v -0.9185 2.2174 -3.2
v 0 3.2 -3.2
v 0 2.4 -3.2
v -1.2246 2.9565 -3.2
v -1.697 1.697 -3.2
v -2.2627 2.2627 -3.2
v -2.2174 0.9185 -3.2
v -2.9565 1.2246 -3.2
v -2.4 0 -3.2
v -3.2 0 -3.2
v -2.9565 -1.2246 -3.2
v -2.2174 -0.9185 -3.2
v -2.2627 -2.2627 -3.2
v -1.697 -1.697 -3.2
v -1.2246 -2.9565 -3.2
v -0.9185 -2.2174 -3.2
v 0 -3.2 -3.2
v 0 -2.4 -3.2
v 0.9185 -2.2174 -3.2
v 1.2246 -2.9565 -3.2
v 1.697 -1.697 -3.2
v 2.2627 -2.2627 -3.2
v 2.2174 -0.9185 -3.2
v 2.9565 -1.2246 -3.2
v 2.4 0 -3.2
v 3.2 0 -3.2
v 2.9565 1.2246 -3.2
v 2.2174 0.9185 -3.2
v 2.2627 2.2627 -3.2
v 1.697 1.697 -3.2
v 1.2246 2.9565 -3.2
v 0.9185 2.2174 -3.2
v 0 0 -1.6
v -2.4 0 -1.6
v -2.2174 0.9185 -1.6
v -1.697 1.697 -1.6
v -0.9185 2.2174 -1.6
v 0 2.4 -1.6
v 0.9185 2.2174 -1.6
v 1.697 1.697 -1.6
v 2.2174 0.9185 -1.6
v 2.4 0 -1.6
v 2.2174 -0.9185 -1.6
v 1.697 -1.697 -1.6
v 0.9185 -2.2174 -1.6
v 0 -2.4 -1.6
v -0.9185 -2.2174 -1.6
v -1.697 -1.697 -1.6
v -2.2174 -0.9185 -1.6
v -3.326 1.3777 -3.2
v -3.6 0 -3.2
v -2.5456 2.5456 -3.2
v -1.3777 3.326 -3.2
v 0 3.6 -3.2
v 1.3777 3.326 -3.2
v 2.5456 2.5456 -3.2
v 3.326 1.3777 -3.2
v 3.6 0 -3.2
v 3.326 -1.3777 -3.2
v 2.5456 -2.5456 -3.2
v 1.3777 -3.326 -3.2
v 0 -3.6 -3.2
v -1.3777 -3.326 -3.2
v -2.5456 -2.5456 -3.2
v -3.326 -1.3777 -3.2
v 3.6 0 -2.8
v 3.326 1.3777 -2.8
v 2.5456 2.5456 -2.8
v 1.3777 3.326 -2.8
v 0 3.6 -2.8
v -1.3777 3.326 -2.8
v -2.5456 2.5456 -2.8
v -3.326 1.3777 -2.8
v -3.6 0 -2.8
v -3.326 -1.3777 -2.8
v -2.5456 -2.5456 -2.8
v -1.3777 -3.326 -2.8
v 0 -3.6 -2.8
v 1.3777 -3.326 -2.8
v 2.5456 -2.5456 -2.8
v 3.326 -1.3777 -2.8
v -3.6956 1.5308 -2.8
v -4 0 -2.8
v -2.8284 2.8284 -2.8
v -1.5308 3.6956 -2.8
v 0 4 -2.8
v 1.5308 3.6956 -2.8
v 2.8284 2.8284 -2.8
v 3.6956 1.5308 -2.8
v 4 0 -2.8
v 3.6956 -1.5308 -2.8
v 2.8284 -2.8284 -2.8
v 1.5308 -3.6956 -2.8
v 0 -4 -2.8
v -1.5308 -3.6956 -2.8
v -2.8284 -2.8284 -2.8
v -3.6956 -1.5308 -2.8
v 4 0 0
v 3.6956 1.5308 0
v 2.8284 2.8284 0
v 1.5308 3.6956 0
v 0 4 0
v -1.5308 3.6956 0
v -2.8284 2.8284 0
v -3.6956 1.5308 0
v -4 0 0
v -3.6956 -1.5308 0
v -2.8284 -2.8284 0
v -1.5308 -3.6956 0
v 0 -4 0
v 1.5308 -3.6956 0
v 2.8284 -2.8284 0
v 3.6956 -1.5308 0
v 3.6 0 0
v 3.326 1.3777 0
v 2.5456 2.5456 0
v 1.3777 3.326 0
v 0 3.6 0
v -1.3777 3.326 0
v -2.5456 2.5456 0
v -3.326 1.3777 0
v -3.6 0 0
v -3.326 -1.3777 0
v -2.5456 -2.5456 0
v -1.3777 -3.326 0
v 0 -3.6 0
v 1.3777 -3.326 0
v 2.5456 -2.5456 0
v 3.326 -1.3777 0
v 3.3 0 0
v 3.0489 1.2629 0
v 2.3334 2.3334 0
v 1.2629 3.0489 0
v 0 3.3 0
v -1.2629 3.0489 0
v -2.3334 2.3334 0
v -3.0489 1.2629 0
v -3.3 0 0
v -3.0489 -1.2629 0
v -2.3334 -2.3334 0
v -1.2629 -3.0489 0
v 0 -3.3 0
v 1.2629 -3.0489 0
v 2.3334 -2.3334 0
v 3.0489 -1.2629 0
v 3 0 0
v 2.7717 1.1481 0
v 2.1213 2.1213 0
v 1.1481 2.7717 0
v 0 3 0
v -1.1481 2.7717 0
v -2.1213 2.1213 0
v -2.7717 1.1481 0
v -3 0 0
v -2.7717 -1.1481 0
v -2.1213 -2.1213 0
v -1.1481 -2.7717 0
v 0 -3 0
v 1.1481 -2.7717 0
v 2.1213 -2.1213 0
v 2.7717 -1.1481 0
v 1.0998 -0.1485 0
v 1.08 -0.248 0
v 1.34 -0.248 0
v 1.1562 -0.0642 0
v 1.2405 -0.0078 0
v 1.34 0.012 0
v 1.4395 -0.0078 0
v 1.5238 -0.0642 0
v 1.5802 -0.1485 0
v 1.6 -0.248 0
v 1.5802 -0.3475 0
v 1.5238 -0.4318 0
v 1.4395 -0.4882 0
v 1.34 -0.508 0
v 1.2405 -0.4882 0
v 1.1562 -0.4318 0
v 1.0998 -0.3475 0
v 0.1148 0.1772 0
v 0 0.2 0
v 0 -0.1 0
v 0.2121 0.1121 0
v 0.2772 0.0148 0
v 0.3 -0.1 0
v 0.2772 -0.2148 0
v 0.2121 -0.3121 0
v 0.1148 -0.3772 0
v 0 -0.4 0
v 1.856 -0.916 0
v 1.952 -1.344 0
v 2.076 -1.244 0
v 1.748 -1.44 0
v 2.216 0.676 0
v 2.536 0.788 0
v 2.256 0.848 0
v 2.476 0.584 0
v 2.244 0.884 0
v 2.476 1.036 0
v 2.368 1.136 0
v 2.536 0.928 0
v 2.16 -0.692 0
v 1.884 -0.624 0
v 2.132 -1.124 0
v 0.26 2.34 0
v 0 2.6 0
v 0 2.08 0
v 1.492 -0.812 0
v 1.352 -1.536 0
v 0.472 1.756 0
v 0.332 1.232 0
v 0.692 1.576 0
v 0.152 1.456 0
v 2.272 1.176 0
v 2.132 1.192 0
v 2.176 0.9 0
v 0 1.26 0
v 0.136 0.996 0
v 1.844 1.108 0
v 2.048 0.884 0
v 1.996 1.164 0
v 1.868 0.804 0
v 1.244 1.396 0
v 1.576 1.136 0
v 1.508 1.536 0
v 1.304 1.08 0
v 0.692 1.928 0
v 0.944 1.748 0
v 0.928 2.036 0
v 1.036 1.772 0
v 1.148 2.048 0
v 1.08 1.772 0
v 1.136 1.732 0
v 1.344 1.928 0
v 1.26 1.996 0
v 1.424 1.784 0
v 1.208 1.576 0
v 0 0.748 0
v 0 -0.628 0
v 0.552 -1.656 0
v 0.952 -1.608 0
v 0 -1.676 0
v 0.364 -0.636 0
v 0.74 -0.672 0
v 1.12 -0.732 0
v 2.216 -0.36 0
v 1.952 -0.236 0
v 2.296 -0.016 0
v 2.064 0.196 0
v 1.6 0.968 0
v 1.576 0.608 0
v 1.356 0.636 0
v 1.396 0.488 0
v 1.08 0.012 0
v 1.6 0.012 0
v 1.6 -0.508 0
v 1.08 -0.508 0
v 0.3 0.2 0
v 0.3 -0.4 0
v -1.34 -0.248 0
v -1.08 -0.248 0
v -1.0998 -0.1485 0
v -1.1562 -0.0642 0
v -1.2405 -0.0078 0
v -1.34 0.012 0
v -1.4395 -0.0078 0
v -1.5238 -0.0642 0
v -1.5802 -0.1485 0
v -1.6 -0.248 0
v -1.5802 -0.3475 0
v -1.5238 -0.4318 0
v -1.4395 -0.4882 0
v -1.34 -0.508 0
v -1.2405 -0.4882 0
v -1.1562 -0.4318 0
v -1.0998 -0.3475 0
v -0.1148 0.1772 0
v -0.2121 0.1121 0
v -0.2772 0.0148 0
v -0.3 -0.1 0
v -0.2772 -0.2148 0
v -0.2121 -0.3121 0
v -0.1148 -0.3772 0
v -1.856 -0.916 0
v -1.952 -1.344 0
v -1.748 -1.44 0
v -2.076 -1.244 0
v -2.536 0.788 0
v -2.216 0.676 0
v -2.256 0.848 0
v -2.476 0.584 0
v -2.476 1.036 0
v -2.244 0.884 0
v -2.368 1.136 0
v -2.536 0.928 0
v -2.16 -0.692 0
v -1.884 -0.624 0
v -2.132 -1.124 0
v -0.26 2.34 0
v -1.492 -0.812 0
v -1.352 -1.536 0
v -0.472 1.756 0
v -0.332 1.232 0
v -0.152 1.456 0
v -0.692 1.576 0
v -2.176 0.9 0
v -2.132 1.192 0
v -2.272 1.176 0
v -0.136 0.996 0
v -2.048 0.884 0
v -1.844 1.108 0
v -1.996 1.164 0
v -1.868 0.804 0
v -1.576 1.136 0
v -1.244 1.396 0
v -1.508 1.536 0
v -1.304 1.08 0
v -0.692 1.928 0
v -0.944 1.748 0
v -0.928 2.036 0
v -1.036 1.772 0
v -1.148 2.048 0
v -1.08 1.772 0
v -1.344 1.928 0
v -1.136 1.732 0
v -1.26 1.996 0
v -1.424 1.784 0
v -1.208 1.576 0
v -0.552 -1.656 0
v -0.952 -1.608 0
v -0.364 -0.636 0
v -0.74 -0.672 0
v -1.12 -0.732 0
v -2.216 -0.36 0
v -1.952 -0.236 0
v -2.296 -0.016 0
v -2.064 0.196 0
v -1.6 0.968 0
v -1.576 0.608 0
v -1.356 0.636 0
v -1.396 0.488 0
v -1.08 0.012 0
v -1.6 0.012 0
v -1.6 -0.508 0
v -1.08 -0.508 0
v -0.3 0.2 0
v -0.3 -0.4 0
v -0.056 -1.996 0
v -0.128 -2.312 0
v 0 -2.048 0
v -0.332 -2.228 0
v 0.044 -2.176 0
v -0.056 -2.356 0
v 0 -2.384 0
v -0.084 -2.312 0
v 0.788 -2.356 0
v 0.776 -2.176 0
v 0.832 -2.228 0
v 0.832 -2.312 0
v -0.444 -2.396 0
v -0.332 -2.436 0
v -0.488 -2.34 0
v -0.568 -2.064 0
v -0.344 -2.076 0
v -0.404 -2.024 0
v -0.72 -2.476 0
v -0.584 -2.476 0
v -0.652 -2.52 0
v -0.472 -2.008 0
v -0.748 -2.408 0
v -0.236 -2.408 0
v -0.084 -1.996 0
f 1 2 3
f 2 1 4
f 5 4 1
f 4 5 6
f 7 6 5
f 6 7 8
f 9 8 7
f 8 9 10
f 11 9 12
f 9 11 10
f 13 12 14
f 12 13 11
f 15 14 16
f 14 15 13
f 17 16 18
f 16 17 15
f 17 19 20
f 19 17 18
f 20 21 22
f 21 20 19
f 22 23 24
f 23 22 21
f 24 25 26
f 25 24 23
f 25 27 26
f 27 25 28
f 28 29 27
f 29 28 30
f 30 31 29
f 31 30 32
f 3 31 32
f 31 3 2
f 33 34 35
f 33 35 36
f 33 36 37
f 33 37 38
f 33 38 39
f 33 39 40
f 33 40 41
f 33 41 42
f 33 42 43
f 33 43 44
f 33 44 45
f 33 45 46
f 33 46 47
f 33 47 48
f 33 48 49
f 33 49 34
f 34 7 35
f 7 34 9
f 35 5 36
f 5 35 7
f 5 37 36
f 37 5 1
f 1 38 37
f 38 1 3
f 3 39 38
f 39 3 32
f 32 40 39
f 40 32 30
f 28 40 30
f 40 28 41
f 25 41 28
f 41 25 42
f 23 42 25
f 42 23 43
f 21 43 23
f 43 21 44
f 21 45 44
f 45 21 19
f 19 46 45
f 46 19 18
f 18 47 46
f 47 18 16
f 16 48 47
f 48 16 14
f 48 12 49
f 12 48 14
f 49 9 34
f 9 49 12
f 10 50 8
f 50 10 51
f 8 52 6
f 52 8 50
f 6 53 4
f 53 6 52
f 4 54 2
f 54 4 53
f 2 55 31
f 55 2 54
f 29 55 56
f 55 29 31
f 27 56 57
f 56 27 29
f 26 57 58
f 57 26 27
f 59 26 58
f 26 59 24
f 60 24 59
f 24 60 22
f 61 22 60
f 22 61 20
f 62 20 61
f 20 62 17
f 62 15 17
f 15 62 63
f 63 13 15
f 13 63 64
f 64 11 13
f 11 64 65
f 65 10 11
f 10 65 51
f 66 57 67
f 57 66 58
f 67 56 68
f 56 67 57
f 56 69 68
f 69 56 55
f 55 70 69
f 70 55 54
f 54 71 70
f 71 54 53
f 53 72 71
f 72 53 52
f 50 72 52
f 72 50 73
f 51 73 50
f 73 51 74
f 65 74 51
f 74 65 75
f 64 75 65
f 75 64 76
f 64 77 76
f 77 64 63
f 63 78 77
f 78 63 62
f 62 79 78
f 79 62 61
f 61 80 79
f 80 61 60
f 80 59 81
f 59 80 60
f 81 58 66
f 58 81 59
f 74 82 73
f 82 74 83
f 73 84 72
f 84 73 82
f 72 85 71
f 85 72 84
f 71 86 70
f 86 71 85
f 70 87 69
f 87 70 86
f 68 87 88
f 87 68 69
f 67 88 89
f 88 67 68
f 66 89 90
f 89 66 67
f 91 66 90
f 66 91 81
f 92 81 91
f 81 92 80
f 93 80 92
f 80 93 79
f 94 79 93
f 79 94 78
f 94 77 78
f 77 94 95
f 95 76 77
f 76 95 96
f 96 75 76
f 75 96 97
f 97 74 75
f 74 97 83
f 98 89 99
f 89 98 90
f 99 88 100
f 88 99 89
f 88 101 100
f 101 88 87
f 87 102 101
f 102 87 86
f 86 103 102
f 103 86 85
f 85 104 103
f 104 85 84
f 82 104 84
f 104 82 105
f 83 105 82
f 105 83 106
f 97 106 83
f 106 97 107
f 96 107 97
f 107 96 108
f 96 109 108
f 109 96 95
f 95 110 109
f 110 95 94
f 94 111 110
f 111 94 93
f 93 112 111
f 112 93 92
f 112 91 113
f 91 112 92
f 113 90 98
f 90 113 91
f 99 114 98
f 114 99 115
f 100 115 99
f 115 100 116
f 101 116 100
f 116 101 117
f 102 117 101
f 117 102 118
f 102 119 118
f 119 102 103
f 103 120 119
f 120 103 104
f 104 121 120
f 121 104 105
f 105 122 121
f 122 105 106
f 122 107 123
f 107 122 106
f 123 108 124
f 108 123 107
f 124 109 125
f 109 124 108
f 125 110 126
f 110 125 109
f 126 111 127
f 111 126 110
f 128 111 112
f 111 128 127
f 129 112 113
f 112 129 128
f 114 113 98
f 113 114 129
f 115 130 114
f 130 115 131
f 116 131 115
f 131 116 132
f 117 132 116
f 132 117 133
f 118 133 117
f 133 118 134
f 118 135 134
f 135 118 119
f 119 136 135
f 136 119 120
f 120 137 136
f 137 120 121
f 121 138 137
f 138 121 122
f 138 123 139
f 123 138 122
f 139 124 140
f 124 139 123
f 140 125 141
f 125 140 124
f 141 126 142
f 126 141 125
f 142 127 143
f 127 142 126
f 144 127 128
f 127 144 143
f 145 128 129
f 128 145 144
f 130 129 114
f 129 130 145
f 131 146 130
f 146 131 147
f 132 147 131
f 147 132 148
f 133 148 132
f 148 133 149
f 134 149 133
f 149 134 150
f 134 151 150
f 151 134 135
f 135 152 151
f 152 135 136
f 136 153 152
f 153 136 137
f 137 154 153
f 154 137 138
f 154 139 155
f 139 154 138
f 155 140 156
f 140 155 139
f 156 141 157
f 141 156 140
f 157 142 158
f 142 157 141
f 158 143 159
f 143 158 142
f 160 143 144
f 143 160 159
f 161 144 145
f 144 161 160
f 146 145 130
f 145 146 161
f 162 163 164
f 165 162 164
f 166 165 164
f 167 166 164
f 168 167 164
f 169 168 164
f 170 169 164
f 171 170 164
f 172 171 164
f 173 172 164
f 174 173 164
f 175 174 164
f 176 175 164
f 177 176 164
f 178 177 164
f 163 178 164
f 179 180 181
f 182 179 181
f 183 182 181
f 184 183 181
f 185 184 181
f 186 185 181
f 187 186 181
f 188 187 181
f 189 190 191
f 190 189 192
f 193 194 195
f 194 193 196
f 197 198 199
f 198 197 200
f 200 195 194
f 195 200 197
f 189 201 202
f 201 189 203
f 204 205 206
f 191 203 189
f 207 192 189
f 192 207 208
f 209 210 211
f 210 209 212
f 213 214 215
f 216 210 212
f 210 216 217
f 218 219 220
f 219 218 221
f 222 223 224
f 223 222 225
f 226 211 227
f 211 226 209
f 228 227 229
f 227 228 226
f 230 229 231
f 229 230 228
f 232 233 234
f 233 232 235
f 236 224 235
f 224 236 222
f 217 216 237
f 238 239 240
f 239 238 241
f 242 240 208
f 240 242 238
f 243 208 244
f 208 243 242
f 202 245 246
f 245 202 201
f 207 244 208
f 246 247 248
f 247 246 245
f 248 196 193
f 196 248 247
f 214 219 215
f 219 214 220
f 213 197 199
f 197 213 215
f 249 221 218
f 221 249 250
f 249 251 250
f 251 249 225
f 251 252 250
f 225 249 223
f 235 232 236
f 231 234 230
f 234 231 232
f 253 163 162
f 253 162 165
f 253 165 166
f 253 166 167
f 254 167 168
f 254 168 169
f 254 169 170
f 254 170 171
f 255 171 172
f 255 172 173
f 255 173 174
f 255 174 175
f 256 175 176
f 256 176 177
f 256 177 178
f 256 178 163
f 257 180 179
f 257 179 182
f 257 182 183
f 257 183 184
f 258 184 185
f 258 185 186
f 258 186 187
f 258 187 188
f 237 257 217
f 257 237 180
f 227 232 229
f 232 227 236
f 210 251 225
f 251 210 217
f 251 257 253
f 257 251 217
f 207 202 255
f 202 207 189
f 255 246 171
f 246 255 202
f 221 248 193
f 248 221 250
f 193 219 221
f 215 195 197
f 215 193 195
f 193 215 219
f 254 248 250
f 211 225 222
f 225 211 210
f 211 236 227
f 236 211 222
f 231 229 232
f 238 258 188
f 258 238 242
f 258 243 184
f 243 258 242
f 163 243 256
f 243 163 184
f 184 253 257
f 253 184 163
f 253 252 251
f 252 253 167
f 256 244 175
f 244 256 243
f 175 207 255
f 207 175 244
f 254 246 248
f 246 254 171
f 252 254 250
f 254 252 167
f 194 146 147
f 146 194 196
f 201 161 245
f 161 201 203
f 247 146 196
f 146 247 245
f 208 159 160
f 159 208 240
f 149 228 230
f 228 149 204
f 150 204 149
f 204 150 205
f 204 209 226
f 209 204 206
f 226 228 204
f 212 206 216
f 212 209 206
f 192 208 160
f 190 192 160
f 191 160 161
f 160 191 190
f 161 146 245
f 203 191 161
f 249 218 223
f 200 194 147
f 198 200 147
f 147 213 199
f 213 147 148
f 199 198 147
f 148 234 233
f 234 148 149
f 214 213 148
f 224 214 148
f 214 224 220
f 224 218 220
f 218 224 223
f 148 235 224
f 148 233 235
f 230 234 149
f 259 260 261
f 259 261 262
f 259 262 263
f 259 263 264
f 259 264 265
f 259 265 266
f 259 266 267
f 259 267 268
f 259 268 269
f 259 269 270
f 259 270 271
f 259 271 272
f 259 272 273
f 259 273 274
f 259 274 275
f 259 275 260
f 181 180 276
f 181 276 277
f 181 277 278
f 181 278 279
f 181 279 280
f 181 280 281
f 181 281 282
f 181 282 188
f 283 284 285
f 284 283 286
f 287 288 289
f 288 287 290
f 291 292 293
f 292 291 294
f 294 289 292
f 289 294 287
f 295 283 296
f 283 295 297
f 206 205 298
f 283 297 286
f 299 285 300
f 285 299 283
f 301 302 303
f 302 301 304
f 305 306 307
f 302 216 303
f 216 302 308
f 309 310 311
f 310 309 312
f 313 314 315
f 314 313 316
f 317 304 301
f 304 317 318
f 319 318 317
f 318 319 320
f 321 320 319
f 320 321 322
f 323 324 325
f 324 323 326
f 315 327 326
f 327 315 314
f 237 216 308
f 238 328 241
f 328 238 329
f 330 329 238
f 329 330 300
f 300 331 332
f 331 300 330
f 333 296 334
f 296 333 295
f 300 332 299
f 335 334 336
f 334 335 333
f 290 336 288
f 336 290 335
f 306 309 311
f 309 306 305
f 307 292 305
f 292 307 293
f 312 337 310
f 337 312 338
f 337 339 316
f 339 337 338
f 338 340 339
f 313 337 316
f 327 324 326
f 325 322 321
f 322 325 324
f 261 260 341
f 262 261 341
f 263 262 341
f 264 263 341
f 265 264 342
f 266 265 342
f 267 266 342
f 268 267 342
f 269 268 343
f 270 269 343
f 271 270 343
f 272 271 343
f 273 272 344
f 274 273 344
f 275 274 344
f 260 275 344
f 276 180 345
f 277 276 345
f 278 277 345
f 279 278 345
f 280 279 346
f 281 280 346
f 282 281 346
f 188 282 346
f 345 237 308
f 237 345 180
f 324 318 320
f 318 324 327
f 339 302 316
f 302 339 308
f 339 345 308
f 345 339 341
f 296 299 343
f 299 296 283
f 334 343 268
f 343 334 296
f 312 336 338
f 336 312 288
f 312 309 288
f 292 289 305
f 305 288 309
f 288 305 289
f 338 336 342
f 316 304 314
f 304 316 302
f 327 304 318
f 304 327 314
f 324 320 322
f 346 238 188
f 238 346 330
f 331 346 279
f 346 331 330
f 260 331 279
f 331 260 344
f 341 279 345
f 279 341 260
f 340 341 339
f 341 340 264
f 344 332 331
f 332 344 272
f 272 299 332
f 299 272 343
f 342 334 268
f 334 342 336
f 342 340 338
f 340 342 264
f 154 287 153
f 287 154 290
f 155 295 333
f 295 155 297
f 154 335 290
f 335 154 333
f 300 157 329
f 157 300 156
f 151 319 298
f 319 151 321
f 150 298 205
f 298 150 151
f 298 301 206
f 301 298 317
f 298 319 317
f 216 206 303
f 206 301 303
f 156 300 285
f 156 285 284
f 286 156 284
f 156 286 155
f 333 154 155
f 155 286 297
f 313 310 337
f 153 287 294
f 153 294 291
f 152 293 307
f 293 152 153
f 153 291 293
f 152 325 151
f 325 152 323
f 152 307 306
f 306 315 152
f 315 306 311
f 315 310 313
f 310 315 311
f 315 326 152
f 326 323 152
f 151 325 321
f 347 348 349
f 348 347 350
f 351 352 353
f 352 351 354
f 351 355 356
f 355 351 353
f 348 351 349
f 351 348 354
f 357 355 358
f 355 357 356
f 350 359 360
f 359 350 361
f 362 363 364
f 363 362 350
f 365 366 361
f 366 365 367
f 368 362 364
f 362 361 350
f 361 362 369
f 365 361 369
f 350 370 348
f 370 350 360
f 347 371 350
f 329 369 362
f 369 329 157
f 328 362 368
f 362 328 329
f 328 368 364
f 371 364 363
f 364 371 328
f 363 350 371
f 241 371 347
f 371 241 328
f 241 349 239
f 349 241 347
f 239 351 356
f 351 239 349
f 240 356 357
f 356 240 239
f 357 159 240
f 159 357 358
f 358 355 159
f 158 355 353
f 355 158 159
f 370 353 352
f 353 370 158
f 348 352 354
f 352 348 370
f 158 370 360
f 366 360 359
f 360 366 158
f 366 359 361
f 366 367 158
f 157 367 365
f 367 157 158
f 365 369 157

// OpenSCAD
use <../lib.scad>
use <../p/4-4ering.scad>
use <../p/4-4ring10.scad>
use <../p/4-4ring11.scad>
use <s/98138p2xs01.scad>
use <s/98138s01.scad>
function ldraw_lib__98138p2x() = [
// 0 Tile  1 x  1 Round with Gold Crown Coin Pattern
// 0 Name: 98138p2x.dat
// 0 Author: Vincent Messenet [Cheenzo]
// 0 !LDRAW_ORG Part UPDATE 2024-06
// 0 !LICENSE Licensed under CC BY 4.0 : see CAreadme.txt
// 
// 0 BFC CERTIFY CCW
  [0,"BFC","CERTIFY"],
  [0,"BFC","CCW"],
// 
// 0 !KEYWORDS Bricklink 98138pb260, Set 10305, Set 43205, Set 43206, Set 43208
// 
// 0 !HISTORY 2024-03-23 [OrionP] Updated ring primitives
// 0 !HISTORY 2024-07-29 [OrionP] Official Update 2024-06
// 
// 1 16 0 0 0 1 0 0 0 1 0 0 0 1 s\98138s01.dat
  [1,16,0,0,0,1,0,0,0,1,0,0,0,1, ldraw_lib__s__98138s01()],
// 1 82 0 0 0 .75 0 0 0 1 0 0 0 .75 4-4ring11.dat
  [1,82,0,0,0,.75,0,0,0,1,0,0,0,.75, ldraw_lib__4_4ring11()],
// 1 308 0 0 0 .75 0 0 0 1 0 0 0 .75 4-4ring10.dat
  [1,308,0,0,0,.75,0,0,0,1,0,0,0,.75, ldraw_lib__4_4ring10()],
// 1 16 0 0 0 7.5 0 0 0 1 0 0 0 7.5 4-4ering.dat
  [1,16,0,0,0,7.5,0,0,0,1,0,0,0,7.5, ldraw_lib__4_4ering()],
// 1 16 0 0 0 1 0 0 0 1 0 0 0 1 s\98138p2xs01.dat
  [1,16,0,0,0,1,0,0,0,1,0,0,0,1, ldraw_lib__s__98138p2xs01()],
// 1 16 0 0 0 -1 0 0 0 1 0 0 0 1 s\98138p2xs01.dat
  [1,16,0,0,0,-1,0,0,0,1,0,0,0,1, ldraw_lib__s__98138p2xs01()],
// 
// 4 308 -.83 0 -5.57 -.32 0 -5.78 0 0 -5.12 -.14 0 -4.99
  [4,308,-.83,0,-5.57,-.32,0,-5.78,0,0,-5.12,-.14,0,-4.99],
// 4 308 0 0 -5.96 .11 0 -5.44 -.21 0 -5.78 -.14 0 -5.89
  [4,308,0,0,-5.96,.11,0,-5.44,-.21,0,-5.78,-.14,0,-5.89],
// 4 308 0 0 -5.96 1.97 0 -5.89 1.94 0 -5.44 .11 0 -5.44
  [4,308,0,0,-5.96,1.97,0,-5.89,1.94,0,-5.44,.11,0,-5.44],
// 4 308 0 0 -5.12 -.32 0 -5.78 -.21 0 -5.78 .11 0 -5.44
  [4,308,0,0,-5.12,-.32,0,-5.78,-.21,0,-5.78,.11,0,-5.44],
// 4 308 2.08 0 -5.78 2.08 0 -5.57 1.94 0 -5.44 1.97 0 -5.89
  [4,308,2.08,0,-5.78,2.08,0,-5.57,1.94,0,-5.44,1.97,0,-5.89],
// 4 308 -.83 0 -6.09 -.83 0 -5.57 -1.22 0 -5.85 -1.11 0 -5.99
  [4,308,-.83,0,-6.09,-.83,0,-5.57,-1.22,0,-5.85,-1.11,0,-5.99],
// 4 308 -1.42 0 -5.16 -.83 0 -5.57 -.86 0 -5.19 -1.01 0 -5.06
  [4,308,-1.42,0,-5.16,-.83,0,-5.57,-.86,0,-5.19,-1.01,0,-5.06],
// 4 308 -1.22 0 -5.85 -1.8 0 -6.19 -1.63 0 -6.3 -1.46 0 -6.19
  [4,308,-1.22,0,-5.85,-1.8,0,-6.19,-1.63,0,-6.3,-1.46,0,-6.19],
// 3 308 -1.18 0 -5.02 -1.42 0 -5.16 -1.01 0 -5.06
  [3,308,-1.18,0,-5.02,-1.42,0,-5.16,-1.01,0,-5.06],
// 4 308 -.83 0 -5.57 -1.42 0 -5.16 -1.87 0 -6.02 -1.22 0 -5.85
  [4,308,-.83,0,-5.57,-1.42,0,-5.16,-1.87,0,-6.02,-1.22,0,-5.85],
// 3 308 -1.8 0 -6.19 -1.22 0 -5.85 -1.87 0 -6.02
  [3,308,-1.8,0,-6.19,-1.22,0,-5.85,-1.87,0,-6.02],
// 4 308 -.83 0 -6.09 -.59 0 -6.02 -.32 0 -5.78 -.83 0 -5.57
  [4,308,-.83,0,-6.09,-.59,0,-6.02,-.32,0,-5.78,-.83,0,-5.57],
// 3 308 -.14 0 -4.99 -.21 0 -4.99 -.83 0 -5.57
  [3,308,-.14,0,-4.99,-.21,0,-4.99,-.83,0,-5.57],
// 4 16 -2.87025 0 -6.92925 -1.87 0 -6.02 -1.42 0 -5.16 -2.38 0 -4.02
  [4,16,-2.87025,0,-6.92925,-1.87,0,-6.02,-1.42,0,-5.16,-2.38,0,-4.02],
// 4 16 -2.38 0 -4.02 -1.42 0 -5.16 -1.18 0 -5.02 -1.38 0 -4.14
  [4,16,-2.38,0,-4.02,-1.42,0,-5.16,-1.18,0,-5.02,-1.38,0,-4.14],
// 3 16 -1.38 0 -4.14 -1.18 0 -5.02 -1.01 0 -5.06
  [3,16,-1.38,0,-4.14,-1.18,0,-5.02,-1.01,0,-5.06],
// 4 16 -.86 0 -5.19 -.21 0 -4.99 -1.38 0 -4.14 -1.01 0 -5.06
  [4,16,-.86,0,-5.19,-.21,0,-4.99,-1.38,0,-4.14,-1.01,0,-5.06],
// 3 16 -.86 0 -5.19 -.83 0 -5.57 -.21 0 -4.99
  [3,16,-.86,0,-5.19,-.83,0,-5.57,-.21,0,-4.99],
// 4 16 -1.38 0 -4.14 -.21 0 -4.99 -.14 0 -4.99 0 0 -4.19
  [4,16,-1.38,0,-4.14,-.21,0,-4.99,-.14,0,-4.99,0,0,-4.19],
// 4 16 0 0 -5.12 1.38 0 -4.14 0 0 -4.19 -.14 0 -4.99
  [4,16,0,0,-5.12,1.38,0,-4.14,0,0,-4.19,-.14,0,-4.99],
// 4 16 1.38 0 -4.14 0 0 -5.12 .11 0 -5.44 1.94 0 -5.44
  [4,16,1.38,0,-4.14,0,0,-5.12,.11,0,-5.44,1.94,0,-5.44],
// 4 16 1.94 0 -5.44 2.08 0 -5.57 2.38 0 -4.02 1.38 0 -4.14
  [4,16,1.94,0,-5.44,2.08,0,-5.57,2.38,0,-4.02,1.38,0,-4.14],
// 4 16 2.38 0 -4.02 2.08 0 -5.57 2.08 0 -5.78 2.87025 0 -6.92925
  [4,16,2.38,0,-4.02,2.08,0,-5.57,2.08,0,-5.78,2.87025,0,-6.92925],
// 3 16 2.08 0 -5.78 1.97 0 -5.89 2.87025 0 -6.92925
  [3,16,2.08,0,-5.78,1.97,0,-5.89,2.87025,0,-6.92925],
// 4 16 2.87025 0 -6.92925 1.97 0 -5.89 0 0 -5.96 0 0 -7.5
  [4,16,2.87025,0,-6.92925,1.97,0,-5.89,0,0,-5.96,0,0,-7.5],
// 4 16 -.14 0 -5.89 -.59 0 -6.02 0 0 -7.5 0 0 -5.96
  [4,16,-.14,0,-5.89,-.59,0,-6.02,0,0,-7.5,0,0,-5.96],
// 4 16 -.59 0 -6.02 -.14 0 -5.89 -.21 0 -5.78 -.32 0 -5.78
  [4,16,-.59,0,-6.02,-.14,0,-5.89,-.21,0,-5.78,-.32,0,-5.78],
// 3 16 0 0 -7.5 -.59 0 -6.02 -.83 0 -6.09
  [3,16,0,0,-7.5,-.59,0,-6.02,-.83,0,-6.09],
// 4 16 -1.46 0 -6.19 0 0 -7.5 -.83 0 -6.09 -1.11 0 -5.99
  [4,16,-1.46,0,-6.19,0,0,-7.5,-.83,0,-6.09,-1.11,0,-5.99],
// 3 16 -1.46 0 -6.19 -1.11 0 -5.99 -1.22 0 -5.85
  [3,16,-1.46,0,-6.19,-1.11,0,-5.99,-1.22,0,-5.85],
// 3 16 -1.46 0 -6.19 -1.63 0 -6.3 0 0 -7.5
  [3,16,-1.46,0,-6.19,-1.63,0,-6.3,0,0,-7.5],
// 4 16 0 0 -7.5 -1.63 0 -6.3 -1.8 0 -6.19 -2.87025 0 -6.92925
  [4,16,0,0,-7.5,-1.63,0,-6.3,-1.8,0,-6.19,-2.87025,0,-6.92925],
// 3 16 -1.8 0 -6.19 -1.87 0 -6.02 -2.87025 0 -6.92925
  [3,16,-1.8,0,-6.19,-1.87,0,-6.02,-2.87025,0,-6.92925],
];
module ldraw_lib__98138p2x(step=0, col=false, unit=2/5, alt=false, line=0.2, solid=!$preview)
    makepoly(ldraw_lib__98138p2x(), step=step, col=col, unit=unit, alt=alt, line=line, solid=solid);
ldraw_lib__98138p2x(line=0.2);
